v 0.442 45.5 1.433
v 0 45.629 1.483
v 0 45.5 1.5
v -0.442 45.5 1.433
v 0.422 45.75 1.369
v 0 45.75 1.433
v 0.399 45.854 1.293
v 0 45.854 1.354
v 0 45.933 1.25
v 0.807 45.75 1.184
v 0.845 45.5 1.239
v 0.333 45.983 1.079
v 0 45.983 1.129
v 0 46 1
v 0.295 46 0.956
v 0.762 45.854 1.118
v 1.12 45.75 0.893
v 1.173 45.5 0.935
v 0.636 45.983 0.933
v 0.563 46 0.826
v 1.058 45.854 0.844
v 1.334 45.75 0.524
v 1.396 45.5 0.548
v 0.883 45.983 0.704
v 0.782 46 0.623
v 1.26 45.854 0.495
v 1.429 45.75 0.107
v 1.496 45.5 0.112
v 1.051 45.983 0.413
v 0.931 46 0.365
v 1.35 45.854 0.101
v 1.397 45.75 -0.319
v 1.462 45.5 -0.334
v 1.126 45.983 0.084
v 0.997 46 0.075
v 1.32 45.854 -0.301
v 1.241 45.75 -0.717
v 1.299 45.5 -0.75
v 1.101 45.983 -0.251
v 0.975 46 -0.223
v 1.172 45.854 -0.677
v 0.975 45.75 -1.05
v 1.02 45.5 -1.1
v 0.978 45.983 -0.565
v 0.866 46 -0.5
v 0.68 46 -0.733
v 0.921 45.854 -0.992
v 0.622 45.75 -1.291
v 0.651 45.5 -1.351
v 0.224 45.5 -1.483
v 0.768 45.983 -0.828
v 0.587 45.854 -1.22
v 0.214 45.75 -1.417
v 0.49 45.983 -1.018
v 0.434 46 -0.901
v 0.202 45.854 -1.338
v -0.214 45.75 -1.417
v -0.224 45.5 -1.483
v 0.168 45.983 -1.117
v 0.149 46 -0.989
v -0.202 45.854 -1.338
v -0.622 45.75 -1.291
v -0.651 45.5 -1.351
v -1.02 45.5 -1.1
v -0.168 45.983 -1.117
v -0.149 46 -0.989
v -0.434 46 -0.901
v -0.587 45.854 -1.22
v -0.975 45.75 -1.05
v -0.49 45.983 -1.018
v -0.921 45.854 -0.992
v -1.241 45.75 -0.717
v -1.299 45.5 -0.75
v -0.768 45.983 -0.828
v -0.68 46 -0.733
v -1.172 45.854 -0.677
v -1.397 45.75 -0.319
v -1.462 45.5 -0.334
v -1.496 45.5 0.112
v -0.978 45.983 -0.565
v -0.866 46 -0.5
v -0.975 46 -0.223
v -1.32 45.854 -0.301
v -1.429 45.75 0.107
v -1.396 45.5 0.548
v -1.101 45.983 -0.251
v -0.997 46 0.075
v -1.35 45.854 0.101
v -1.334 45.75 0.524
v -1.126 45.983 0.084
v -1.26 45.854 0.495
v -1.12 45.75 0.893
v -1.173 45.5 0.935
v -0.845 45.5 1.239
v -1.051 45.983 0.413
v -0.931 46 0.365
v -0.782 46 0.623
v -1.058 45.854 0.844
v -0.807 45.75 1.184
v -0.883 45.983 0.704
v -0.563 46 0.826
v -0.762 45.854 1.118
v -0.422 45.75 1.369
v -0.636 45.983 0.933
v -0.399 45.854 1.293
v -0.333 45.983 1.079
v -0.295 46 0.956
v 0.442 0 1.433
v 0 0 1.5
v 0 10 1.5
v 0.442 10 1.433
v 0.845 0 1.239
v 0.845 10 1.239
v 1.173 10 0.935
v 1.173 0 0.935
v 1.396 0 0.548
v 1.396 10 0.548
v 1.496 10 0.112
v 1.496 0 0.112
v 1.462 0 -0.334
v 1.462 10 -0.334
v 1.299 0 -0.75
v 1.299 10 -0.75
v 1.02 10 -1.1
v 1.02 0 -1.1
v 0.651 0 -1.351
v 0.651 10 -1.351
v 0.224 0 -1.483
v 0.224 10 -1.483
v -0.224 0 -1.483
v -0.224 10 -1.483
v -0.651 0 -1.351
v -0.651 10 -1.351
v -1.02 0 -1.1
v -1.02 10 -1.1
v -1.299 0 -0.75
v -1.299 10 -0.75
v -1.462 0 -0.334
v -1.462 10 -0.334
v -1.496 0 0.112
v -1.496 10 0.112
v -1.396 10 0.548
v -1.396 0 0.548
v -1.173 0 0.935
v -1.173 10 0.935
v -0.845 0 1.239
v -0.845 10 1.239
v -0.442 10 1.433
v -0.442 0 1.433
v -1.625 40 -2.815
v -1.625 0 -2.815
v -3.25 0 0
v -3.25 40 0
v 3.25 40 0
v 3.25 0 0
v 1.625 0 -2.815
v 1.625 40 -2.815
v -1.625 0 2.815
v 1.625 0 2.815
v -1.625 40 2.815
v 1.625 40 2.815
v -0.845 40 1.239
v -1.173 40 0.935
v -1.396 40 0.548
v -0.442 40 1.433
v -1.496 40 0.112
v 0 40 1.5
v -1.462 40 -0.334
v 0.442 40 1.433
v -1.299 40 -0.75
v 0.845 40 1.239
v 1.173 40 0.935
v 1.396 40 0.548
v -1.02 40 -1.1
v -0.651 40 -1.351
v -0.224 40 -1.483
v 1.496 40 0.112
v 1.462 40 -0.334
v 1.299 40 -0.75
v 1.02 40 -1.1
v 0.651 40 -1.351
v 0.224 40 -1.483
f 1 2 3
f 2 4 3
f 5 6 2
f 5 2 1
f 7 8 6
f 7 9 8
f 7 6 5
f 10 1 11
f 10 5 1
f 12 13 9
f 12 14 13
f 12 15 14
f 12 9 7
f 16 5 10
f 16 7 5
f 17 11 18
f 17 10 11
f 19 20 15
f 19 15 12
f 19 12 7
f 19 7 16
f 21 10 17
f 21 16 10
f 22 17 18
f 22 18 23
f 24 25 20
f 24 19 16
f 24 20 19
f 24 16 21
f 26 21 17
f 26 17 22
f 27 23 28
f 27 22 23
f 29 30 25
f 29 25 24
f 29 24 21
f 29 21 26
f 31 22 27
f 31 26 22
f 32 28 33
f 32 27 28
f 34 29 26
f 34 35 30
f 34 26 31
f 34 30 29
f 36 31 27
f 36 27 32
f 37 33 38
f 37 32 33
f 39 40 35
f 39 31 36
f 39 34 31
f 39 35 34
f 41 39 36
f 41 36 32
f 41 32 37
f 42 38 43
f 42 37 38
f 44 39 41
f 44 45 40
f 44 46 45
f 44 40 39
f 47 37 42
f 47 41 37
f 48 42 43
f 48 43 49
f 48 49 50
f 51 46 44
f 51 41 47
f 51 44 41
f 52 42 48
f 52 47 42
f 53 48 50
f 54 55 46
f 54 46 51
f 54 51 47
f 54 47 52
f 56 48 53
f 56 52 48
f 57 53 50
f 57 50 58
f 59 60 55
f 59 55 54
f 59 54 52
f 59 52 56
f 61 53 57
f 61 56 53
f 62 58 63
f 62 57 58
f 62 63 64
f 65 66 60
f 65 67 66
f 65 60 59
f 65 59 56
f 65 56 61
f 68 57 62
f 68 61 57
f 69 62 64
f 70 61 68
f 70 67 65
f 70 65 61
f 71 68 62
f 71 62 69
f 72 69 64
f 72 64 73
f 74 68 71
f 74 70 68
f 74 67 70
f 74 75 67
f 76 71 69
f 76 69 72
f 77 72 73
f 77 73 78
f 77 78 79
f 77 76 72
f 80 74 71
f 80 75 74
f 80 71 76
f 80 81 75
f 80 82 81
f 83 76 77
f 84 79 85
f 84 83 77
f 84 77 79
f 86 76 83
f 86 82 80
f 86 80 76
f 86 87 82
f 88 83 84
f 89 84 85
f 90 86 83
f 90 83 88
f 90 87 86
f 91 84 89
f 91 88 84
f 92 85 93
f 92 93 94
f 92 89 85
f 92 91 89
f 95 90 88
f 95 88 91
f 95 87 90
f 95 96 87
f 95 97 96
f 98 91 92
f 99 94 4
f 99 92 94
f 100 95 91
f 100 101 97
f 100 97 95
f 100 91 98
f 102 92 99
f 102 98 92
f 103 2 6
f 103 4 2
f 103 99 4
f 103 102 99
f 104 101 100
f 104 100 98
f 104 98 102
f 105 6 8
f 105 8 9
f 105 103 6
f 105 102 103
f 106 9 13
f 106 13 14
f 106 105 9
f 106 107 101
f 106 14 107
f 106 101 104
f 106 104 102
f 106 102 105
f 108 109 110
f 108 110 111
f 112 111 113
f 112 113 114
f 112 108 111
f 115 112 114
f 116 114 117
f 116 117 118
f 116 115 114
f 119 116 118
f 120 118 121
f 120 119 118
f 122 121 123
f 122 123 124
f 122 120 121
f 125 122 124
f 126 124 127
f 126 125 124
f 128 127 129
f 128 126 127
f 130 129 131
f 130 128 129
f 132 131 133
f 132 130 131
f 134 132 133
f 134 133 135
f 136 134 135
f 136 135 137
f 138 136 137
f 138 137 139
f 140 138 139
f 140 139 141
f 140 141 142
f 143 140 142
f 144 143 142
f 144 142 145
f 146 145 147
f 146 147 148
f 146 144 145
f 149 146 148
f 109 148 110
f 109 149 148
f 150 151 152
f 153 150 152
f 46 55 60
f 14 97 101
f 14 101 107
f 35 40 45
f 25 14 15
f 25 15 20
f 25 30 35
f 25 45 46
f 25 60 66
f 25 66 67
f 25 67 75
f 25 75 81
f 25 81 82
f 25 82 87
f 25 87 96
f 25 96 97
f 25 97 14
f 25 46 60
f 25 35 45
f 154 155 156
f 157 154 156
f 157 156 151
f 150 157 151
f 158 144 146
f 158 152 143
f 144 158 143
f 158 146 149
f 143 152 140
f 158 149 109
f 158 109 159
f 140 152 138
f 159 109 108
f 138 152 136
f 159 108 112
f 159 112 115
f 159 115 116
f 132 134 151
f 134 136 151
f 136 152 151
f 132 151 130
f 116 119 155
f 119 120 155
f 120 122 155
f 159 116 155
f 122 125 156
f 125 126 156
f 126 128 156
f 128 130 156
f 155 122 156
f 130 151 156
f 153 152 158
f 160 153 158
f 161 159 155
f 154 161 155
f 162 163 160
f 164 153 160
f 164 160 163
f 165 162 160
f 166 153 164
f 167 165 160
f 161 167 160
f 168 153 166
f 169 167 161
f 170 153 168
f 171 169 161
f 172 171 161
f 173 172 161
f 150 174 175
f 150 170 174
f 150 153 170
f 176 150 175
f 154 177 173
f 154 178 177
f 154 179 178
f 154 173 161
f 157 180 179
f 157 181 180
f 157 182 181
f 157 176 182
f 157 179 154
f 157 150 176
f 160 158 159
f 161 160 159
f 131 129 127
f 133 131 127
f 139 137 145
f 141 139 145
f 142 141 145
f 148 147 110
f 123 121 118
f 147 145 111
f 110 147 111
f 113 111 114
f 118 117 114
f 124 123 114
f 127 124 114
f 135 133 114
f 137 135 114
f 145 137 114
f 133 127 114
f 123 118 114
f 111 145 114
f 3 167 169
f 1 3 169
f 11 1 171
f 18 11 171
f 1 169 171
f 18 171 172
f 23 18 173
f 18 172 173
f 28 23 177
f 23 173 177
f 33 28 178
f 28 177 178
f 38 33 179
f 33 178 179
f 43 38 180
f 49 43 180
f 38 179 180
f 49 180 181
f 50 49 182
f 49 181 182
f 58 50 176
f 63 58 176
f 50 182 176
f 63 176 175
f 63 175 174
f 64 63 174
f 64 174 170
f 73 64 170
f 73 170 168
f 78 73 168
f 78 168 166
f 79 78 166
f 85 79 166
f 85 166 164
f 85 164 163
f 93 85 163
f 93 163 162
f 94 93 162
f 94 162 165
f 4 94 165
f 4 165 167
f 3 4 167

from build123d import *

# Parameters (mm, degrees)
SKETCH_1_R          = 1.5
EXTRUDE_1_DEPTH     = 46
FILLET_1_R          = 0.5
SKETCH_2_R          = 1.5
EXTRUDE_2_DEPTH     = 40
SKETCH_1_2_R        = 1.5
CUT_EXTRUDE_1_DEPTH = 10


with BuildPart() as part:
    # 草图1 → 凸台-拉伸1 (new body)
    with BuildSketch(Plane(origin=(0, 0, 0), x_dir=(1, 0, 0), z_dir=(0, 1, 0))):
        with Locations(Location((0, 0, 0), (0, 0, 270))):
            Circle(SKETCH_1_R)
    extrude(amount=EXTRUDE_1_DEPTH)

    # 圆角1
    fillet_1_edges = [part.edges().sort_by_distance(p)[0] for p in [
        (0, 46, -1.5),
    ]]
    fillet(fillet_1_edges, radius=FILLET_1_R)

    # 草图2 → 凸台-拉伸2 (add)
    with BuildSketch(Plane(origin=(0, 0, 0), x_dir=(1, 0, 0), z_dir=(0, 1, 0))):
        Polygon((-1.625, 2.814582562), (-3.25, 0), (-1.625, -2.814582562), (1.625, -2.814582562), (3.25, 0), (1.625, 2.814582562), align=None)
        with Locations(Location((0, 0, 0), (0, 0, 270))):
            Circle(SKETCH_2_R, mode=Mode.SUBTRACT)
    extrude(amount=EXTRUDE_2_DEPTH)

    # 草图1<2> → 切除-拉伸1 (cut)
    with BuildSketch(Plane(origin=(0, 0, 0), x_dir=(1, 0, 0), z_dir=(0, 1, 0))):
        with Locations(Location((0, 0, 0), (0, 0, 270))):
            Circle(SKETCH_1_2_R)
    extrude(amount=CUT_EXTRUDE_1_DEPTH, mode=Mode.SUBTRACT)


solid = part.part
